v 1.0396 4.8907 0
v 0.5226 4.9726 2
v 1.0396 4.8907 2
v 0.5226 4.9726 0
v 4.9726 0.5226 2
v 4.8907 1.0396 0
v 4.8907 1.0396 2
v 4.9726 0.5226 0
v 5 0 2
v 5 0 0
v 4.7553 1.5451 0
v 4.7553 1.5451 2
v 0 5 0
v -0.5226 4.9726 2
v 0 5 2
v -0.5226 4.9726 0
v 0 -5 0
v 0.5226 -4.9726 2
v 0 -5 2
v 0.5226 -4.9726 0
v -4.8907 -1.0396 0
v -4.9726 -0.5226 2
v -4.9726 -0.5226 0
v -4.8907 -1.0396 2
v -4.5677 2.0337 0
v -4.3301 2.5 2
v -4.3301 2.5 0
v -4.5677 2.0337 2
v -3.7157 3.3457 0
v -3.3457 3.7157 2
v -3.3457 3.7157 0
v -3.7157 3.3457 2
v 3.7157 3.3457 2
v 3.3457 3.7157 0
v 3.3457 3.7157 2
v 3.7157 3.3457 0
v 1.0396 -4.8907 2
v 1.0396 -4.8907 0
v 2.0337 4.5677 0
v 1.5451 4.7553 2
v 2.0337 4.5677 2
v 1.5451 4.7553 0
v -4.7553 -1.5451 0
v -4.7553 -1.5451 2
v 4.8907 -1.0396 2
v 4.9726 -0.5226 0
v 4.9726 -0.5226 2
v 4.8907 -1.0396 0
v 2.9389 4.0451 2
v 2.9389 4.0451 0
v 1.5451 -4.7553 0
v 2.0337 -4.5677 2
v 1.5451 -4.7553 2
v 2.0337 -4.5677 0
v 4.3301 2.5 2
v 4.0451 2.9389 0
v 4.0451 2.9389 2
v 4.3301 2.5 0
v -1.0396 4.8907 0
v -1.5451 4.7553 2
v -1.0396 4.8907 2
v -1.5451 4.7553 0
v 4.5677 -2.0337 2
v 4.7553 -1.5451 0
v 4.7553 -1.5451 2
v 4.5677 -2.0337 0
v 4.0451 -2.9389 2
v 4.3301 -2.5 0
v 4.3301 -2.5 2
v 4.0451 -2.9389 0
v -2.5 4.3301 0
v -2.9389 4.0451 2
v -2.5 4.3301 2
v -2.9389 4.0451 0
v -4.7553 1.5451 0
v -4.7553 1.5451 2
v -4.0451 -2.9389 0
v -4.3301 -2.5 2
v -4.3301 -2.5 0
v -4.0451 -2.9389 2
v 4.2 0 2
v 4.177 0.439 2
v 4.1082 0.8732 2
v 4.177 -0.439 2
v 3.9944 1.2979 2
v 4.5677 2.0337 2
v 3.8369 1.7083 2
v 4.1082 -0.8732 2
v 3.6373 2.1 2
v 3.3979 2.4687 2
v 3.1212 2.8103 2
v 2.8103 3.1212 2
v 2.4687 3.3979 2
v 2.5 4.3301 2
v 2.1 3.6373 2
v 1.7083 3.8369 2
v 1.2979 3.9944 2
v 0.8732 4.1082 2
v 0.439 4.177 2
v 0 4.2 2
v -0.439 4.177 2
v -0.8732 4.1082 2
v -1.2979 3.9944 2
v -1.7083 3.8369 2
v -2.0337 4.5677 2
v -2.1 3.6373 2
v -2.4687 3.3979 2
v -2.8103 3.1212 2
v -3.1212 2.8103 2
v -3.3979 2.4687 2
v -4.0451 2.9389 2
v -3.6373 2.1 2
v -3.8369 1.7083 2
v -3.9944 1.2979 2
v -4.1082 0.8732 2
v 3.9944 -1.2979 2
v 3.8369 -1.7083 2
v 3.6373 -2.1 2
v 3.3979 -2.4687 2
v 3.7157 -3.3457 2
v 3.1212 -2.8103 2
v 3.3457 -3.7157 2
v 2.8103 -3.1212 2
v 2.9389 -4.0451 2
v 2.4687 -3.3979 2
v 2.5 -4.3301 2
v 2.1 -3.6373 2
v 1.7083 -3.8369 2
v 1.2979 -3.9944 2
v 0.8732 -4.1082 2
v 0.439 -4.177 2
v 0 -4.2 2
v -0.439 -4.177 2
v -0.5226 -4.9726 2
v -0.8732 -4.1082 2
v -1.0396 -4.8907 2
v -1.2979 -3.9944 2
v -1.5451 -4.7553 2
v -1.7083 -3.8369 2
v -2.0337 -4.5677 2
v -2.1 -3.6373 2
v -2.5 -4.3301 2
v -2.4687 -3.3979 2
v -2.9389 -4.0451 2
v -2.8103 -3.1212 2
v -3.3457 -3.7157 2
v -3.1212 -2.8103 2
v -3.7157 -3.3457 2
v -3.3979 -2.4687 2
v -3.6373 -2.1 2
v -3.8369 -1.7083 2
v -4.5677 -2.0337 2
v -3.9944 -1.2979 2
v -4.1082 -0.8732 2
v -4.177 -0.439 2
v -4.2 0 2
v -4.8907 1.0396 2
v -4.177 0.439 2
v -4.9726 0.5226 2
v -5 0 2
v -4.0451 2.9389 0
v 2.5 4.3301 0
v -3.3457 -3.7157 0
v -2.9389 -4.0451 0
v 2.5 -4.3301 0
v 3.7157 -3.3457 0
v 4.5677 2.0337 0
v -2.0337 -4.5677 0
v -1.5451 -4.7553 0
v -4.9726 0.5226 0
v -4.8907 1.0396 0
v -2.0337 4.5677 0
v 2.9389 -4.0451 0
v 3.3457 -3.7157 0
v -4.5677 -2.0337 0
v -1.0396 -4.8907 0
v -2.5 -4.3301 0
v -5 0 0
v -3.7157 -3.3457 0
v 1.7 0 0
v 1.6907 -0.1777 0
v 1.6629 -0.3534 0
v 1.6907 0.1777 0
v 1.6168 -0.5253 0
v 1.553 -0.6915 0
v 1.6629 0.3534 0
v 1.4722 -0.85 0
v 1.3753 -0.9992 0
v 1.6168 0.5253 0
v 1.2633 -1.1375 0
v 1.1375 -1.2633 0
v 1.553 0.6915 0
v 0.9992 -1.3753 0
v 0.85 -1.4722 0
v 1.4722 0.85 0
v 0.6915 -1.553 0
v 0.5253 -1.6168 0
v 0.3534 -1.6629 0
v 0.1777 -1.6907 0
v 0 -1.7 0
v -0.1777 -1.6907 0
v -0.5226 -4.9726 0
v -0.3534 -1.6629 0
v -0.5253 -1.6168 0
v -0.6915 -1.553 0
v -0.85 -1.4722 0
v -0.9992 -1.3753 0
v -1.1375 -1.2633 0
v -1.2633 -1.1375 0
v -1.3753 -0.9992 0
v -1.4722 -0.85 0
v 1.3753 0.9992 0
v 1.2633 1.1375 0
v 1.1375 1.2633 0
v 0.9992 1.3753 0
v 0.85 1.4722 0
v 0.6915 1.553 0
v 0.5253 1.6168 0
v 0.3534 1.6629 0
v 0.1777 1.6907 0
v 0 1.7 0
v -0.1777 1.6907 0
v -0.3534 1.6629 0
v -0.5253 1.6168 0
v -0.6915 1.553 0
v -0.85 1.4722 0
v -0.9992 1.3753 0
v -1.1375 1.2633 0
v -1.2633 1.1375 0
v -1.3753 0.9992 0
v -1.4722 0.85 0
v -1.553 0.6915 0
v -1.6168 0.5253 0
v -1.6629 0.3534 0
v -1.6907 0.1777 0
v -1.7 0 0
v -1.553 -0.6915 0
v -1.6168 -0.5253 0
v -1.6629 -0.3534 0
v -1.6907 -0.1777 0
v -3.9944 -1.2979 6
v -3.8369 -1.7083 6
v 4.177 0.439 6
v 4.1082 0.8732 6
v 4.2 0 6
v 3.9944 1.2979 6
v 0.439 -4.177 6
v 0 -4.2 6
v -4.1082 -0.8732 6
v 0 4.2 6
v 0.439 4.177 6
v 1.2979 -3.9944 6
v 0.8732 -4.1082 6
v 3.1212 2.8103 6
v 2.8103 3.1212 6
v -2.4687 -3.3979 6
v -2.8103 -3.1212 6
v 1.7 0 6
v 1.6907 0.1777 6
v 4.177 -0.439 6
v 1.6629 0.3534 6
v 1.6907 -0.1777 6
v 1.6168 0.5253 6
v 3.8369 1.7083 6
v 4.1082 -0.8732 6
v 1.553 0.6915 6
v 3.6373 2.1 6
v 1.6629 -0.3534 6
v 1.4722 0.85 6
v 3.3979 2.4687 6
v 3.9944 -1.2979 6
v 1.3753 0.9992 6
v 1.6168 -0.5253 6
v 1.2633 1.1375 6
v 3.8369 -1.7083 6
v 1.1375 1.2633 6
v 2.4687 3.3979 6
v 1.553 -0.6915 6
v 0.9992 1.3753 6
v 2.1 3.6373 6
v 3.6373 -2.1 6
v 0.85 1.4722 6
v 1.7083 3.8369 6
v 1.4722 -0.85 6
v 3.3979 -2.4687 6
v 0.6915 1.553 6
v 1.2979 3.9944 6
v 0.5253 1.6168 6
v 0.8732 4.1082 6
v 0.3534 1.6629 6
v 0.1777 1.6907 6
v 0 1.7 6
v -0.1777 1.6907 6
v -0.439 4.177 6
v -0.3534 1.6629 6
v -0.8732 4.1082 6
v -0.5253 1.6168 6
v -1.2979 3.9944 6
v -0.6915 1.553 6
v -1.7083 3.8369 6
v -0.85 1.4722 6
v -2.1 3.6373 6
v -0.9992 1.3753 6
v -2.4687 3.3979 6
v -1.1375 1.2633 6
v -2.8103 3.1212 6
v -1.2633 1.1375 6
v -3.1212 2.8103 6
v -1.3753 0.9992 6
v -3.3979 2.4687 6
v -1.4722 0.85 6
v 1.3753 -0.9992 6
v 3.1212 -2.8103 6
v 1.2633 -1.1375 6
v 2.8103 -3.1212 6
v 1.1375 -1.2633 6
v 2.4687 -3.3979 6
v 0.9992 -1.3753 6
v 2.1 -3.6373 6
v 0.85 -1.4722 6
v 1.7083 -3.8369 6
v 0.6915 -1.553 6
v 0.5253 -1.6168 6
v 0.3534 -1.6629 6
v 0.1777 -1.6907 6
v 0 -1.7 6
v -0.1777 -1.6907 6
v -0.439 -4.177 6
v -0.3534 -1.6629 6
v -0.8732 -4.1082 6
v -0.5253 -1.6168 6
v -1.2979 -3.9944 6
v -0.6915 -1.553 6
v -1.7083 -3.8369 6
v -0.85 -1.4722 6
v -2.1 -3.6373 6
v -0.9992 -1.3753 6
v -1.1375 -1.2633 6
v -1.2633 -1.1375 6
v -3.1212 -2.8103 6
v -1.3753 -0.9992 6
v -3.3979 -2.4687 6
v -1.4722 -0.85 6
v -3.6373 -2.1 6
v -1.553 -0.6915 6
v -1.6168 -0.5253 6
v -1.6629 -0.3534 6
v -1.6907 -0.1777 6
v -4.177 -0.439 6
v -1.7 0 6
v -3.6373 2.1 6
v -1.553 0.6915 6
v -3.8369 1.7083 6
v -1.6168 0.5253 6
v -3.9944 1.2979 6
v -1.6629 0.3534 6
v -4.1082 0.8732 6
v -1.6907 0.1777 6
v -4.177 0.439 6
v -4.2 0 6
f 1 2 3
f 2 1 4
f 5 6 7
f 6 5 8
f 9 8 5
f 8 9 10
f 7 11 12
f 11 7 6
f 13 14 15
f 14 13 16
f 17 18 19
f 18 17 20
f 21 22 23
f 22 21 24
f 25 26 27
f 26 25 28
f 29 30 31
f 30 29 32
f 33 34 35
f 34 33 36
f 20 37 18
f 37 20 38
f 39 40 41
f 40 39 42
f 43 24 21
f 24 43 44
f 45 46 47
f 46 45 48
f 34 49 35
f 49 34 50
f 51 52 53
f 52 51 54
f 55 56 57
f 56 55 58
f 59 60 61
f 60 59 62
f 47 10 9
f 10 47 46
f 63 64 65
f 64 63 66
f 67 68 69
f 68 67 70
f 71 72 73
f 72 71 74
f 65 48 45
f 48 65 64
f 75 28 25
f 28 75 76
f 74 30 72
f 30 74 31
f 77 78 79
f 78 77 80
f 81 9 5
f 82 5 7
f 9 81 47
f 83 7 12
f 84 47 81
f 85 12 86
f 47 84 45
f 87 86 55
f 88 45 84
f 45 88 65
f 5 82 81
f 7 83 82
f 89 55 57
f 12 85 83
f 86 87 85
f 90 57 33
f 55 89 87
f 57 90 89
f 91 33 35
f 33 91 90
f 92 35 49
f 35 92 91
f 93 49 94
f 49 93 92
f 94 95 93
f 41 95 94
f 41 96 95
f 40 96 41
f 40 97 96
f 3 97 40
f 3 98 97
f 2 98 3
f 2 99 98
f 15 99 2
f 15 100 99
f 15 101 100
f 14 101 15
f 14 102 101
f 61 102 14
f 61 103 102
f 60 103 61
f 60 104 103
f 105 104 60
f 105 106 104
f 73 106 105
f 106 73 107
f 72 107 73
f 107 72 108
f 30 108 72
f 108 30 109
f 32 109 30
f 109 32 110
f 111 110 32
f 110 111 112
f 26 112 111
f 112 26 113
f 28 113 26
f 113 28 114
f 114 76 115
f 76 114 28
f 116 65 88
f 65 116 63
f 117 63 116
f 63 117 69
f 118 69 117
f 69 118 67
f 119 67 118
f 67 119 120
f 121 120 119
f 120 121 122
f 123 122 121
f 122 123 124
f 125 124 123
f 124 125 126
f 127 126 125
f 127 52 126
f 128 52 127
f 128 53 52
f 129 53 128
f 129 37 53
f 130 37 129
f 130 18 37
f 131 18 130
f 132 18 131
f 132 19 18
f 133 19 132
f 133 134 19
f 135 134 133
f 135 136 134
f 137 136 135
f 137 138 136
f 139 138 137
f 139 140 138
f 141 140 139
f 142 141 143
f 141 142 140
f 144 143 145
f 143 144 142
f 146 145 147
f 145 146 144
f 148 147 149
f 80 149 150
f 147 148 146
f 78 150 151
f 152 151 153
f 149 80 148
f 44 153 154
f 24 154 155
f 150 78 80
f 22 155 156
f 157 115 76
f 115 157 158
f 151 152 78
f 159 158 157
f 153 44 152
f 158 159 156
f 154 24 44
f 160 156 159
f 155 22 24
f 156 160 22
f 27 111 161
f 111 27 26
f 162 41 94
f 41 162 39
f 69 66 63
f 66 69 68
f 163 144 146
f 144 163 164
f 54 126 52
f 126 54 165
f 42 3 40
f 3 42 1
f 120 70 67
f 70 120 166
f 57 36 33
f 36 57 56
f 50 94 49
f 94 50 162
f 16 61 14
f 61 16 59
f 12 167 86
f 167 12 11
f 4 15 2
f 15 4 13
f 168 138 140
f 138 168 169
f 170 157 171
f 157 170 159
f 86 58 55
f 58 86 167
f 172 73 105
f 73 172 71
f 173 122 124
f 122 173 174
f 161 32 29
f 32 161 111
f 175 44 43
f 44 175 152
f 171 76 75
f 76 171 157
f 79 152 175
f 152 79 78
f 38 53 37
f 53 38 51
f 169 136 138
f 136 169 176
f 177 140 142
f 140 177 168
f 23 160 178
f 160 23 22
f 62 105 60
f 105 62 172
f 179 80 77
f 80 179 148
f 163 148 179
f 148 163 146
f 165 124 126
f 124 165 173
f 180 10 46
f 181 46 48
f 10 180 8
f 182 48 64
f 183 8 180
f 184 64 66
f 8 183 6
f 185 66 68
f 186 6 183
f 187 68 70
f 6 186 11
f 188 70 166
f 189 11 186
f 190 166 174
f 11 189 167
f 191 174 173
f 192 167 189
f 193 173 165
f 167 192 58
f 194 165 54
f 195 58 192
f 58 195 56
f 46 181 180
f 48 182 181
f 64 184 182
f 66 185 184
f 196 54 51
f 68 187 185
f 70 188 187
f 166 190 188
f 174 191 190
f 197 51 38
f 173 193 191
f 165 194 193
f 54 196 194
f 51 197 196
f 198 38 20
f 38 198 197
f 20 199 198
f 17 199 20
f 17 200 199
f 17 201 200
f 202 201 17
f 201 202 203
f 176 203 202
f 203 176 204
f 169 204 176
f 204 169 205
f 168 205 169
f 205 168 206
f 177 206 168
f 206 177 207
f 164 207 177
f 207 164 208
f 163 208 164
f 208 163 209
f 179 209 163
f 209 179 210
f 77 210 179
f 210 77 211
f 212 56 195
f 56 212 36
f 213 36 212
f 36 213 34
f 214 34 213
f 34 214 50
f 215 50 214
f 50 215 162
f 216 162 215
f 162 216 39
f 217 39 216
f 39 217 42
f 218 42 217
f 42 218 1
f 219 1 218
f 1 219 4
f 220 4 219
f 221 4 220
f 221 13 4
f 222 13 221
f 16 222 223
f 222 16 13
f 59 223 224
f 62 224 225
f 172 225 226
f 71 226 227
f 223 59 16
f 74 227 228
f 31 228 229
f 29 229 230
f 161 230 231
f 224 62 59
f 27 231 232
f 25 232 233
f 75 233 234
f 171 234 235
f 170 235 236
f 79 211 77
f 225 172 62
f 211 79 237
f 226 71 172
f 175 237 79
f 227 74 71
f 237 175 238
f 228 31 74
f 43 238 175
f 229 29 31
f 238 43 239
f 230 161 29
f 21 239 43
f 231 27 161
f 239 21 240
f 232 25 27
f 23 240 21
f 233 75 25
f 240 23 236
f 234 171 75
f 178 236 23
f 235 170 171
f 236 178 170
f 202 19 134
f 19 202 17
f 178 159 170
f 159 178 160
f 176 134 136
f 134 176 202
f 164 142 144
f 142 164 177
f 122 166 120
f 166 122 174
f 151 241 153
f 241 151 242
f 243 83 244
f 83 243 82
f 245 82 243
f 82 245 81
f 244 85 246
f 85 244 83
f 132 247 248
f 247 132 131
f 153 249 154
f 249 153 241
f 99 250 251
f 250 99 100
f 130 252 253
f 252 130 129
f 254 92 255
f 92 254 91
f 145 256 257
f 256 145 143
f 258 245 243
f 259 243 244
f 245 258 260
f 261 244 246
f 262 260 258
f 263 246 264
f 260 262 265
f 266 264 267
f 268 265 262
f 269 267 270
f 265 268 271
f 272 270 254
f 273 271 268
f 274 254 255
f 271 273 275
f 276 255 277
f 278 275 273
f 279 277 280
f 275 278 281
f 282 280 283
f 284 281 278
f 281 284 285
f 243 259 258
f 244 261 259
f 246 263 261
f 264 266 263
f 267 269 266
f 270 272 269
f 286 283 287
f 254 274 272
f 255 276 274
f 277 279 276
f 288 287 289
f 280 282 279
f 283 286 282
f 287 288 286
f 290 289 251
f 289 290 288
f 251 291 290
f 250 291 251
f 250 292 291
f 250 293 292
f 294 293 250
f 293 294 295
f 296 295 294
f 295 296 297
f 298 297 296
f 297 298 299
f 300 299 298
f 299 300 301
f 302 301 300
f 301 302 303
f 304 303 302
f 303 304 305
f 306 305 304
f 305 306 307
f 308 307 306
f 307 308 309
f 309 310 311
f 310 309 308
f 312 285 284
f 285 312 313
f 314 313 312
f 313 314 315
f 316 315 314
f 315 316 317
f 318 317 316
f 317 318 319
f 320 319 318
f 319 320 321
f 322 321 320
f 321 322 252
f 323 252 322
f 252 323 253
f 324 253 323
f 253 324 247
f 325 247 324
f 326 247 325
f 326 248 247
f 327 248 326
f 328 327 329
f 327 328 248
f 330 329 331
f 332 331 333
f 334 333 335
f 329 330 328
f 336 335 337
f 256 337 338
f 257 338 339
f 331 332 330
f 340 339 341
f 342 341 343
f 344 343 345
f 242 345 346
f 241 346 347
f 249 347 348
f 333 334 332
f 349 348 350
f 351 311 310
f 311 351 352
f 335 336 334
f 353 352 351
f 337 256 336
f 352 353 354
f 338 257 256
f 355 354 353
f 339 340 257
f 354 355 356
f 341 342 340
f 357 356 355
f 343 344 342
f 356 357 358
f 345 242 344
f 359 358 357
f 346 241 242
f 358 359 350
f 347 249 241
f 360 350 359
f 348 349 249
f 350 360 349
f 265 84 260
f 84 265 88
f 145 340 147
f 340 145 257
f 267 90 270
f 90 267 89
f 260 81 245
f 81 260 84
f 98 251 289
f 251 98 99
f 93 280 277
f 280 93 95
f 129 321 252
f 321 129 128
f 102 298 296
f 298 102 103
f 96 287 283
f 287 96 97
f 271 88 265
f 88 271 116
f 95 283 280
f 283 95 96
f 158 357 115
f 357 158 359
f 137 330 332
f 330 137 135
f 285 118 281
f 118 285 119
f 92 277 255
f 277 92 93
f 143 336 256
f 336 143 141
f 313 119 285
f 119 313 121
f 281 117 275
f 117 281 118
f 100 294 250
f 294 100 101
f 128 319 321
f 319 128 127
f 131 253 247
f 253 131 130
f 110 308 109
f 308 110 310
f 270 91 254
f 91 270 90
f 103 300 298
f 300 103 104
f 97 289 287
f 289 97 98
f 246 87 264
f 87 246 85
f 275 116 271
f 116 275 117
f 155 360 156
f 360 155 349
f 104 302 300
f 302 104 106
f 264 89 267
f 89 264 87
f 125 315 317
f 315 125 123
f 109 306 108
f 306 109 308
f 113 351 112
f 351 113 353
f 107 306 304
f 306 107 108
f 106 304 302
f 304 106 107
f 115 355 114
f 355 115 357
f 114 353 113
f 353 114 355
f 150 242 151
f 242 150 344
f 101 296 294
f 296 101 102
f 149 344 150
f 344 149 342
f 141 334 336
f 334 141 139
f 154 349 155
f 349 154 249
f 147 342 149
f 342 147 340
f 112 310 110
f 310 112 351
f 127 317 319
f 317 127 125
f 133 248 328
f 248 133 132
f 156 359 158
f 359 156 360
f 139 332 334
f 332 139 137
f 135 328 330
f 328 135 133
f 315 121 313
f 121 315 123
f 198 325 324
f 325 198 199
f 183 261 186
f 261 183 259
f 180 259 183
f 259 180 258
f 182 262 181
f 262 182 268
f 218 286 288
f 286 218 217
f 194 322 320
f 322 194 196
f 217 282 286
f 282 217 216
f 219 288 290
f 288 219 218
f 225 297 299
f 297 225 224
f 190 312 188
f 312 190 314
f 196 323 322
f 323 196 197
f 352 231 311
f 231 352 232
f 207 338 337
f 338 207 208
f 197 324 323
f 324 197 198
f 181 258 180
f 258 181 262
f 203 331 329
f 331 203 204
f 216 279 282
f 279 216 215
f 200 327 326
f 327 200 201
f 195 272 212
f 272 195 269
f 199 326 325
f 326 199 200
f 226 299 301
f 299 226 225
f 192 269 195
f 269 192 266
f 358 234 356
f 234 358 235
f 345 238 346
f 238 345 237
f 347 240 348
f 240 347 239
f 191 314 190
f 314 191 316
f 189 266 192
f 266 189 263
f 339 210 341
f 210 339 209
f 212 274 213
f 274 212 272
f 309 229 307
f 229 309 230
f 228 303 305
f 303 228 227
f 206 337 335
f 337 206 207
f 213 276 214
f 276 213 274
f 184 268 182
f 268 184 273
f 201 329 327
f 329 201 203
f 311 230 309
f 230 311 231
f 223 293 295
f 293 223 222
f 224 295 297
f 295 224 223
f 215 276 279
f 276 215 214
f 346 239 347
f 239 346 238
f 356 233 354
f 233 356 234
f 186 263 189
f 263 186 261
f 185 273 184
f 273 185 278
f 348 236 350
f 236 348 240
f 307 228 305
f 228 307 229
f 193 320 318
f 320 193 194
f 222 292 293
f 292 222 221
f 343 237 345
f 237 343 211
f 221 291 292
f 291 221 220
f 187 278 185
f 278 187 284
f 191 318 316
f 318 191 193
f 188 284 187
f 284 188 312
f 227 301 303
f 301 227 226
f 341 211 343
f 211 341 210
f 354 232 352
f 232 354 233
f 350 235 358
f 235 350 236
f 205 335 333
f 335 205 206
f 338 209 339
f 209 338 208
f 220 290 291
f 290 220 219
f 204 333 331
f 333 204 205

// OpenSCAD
// PCB standoff with mounting base.
$fn = 60;
eps = 0.02;
thread_d = 3.4;
base_d = 10;
height = 6;
body_d = thread_d+5;
difference() {
    union() { cylinder(d=base_d,h=2); cylinder(d=body_d,h=height); }
    translate([0,0,-eps]) cylinder(d=thread_d,h=height+2*eps);
}
